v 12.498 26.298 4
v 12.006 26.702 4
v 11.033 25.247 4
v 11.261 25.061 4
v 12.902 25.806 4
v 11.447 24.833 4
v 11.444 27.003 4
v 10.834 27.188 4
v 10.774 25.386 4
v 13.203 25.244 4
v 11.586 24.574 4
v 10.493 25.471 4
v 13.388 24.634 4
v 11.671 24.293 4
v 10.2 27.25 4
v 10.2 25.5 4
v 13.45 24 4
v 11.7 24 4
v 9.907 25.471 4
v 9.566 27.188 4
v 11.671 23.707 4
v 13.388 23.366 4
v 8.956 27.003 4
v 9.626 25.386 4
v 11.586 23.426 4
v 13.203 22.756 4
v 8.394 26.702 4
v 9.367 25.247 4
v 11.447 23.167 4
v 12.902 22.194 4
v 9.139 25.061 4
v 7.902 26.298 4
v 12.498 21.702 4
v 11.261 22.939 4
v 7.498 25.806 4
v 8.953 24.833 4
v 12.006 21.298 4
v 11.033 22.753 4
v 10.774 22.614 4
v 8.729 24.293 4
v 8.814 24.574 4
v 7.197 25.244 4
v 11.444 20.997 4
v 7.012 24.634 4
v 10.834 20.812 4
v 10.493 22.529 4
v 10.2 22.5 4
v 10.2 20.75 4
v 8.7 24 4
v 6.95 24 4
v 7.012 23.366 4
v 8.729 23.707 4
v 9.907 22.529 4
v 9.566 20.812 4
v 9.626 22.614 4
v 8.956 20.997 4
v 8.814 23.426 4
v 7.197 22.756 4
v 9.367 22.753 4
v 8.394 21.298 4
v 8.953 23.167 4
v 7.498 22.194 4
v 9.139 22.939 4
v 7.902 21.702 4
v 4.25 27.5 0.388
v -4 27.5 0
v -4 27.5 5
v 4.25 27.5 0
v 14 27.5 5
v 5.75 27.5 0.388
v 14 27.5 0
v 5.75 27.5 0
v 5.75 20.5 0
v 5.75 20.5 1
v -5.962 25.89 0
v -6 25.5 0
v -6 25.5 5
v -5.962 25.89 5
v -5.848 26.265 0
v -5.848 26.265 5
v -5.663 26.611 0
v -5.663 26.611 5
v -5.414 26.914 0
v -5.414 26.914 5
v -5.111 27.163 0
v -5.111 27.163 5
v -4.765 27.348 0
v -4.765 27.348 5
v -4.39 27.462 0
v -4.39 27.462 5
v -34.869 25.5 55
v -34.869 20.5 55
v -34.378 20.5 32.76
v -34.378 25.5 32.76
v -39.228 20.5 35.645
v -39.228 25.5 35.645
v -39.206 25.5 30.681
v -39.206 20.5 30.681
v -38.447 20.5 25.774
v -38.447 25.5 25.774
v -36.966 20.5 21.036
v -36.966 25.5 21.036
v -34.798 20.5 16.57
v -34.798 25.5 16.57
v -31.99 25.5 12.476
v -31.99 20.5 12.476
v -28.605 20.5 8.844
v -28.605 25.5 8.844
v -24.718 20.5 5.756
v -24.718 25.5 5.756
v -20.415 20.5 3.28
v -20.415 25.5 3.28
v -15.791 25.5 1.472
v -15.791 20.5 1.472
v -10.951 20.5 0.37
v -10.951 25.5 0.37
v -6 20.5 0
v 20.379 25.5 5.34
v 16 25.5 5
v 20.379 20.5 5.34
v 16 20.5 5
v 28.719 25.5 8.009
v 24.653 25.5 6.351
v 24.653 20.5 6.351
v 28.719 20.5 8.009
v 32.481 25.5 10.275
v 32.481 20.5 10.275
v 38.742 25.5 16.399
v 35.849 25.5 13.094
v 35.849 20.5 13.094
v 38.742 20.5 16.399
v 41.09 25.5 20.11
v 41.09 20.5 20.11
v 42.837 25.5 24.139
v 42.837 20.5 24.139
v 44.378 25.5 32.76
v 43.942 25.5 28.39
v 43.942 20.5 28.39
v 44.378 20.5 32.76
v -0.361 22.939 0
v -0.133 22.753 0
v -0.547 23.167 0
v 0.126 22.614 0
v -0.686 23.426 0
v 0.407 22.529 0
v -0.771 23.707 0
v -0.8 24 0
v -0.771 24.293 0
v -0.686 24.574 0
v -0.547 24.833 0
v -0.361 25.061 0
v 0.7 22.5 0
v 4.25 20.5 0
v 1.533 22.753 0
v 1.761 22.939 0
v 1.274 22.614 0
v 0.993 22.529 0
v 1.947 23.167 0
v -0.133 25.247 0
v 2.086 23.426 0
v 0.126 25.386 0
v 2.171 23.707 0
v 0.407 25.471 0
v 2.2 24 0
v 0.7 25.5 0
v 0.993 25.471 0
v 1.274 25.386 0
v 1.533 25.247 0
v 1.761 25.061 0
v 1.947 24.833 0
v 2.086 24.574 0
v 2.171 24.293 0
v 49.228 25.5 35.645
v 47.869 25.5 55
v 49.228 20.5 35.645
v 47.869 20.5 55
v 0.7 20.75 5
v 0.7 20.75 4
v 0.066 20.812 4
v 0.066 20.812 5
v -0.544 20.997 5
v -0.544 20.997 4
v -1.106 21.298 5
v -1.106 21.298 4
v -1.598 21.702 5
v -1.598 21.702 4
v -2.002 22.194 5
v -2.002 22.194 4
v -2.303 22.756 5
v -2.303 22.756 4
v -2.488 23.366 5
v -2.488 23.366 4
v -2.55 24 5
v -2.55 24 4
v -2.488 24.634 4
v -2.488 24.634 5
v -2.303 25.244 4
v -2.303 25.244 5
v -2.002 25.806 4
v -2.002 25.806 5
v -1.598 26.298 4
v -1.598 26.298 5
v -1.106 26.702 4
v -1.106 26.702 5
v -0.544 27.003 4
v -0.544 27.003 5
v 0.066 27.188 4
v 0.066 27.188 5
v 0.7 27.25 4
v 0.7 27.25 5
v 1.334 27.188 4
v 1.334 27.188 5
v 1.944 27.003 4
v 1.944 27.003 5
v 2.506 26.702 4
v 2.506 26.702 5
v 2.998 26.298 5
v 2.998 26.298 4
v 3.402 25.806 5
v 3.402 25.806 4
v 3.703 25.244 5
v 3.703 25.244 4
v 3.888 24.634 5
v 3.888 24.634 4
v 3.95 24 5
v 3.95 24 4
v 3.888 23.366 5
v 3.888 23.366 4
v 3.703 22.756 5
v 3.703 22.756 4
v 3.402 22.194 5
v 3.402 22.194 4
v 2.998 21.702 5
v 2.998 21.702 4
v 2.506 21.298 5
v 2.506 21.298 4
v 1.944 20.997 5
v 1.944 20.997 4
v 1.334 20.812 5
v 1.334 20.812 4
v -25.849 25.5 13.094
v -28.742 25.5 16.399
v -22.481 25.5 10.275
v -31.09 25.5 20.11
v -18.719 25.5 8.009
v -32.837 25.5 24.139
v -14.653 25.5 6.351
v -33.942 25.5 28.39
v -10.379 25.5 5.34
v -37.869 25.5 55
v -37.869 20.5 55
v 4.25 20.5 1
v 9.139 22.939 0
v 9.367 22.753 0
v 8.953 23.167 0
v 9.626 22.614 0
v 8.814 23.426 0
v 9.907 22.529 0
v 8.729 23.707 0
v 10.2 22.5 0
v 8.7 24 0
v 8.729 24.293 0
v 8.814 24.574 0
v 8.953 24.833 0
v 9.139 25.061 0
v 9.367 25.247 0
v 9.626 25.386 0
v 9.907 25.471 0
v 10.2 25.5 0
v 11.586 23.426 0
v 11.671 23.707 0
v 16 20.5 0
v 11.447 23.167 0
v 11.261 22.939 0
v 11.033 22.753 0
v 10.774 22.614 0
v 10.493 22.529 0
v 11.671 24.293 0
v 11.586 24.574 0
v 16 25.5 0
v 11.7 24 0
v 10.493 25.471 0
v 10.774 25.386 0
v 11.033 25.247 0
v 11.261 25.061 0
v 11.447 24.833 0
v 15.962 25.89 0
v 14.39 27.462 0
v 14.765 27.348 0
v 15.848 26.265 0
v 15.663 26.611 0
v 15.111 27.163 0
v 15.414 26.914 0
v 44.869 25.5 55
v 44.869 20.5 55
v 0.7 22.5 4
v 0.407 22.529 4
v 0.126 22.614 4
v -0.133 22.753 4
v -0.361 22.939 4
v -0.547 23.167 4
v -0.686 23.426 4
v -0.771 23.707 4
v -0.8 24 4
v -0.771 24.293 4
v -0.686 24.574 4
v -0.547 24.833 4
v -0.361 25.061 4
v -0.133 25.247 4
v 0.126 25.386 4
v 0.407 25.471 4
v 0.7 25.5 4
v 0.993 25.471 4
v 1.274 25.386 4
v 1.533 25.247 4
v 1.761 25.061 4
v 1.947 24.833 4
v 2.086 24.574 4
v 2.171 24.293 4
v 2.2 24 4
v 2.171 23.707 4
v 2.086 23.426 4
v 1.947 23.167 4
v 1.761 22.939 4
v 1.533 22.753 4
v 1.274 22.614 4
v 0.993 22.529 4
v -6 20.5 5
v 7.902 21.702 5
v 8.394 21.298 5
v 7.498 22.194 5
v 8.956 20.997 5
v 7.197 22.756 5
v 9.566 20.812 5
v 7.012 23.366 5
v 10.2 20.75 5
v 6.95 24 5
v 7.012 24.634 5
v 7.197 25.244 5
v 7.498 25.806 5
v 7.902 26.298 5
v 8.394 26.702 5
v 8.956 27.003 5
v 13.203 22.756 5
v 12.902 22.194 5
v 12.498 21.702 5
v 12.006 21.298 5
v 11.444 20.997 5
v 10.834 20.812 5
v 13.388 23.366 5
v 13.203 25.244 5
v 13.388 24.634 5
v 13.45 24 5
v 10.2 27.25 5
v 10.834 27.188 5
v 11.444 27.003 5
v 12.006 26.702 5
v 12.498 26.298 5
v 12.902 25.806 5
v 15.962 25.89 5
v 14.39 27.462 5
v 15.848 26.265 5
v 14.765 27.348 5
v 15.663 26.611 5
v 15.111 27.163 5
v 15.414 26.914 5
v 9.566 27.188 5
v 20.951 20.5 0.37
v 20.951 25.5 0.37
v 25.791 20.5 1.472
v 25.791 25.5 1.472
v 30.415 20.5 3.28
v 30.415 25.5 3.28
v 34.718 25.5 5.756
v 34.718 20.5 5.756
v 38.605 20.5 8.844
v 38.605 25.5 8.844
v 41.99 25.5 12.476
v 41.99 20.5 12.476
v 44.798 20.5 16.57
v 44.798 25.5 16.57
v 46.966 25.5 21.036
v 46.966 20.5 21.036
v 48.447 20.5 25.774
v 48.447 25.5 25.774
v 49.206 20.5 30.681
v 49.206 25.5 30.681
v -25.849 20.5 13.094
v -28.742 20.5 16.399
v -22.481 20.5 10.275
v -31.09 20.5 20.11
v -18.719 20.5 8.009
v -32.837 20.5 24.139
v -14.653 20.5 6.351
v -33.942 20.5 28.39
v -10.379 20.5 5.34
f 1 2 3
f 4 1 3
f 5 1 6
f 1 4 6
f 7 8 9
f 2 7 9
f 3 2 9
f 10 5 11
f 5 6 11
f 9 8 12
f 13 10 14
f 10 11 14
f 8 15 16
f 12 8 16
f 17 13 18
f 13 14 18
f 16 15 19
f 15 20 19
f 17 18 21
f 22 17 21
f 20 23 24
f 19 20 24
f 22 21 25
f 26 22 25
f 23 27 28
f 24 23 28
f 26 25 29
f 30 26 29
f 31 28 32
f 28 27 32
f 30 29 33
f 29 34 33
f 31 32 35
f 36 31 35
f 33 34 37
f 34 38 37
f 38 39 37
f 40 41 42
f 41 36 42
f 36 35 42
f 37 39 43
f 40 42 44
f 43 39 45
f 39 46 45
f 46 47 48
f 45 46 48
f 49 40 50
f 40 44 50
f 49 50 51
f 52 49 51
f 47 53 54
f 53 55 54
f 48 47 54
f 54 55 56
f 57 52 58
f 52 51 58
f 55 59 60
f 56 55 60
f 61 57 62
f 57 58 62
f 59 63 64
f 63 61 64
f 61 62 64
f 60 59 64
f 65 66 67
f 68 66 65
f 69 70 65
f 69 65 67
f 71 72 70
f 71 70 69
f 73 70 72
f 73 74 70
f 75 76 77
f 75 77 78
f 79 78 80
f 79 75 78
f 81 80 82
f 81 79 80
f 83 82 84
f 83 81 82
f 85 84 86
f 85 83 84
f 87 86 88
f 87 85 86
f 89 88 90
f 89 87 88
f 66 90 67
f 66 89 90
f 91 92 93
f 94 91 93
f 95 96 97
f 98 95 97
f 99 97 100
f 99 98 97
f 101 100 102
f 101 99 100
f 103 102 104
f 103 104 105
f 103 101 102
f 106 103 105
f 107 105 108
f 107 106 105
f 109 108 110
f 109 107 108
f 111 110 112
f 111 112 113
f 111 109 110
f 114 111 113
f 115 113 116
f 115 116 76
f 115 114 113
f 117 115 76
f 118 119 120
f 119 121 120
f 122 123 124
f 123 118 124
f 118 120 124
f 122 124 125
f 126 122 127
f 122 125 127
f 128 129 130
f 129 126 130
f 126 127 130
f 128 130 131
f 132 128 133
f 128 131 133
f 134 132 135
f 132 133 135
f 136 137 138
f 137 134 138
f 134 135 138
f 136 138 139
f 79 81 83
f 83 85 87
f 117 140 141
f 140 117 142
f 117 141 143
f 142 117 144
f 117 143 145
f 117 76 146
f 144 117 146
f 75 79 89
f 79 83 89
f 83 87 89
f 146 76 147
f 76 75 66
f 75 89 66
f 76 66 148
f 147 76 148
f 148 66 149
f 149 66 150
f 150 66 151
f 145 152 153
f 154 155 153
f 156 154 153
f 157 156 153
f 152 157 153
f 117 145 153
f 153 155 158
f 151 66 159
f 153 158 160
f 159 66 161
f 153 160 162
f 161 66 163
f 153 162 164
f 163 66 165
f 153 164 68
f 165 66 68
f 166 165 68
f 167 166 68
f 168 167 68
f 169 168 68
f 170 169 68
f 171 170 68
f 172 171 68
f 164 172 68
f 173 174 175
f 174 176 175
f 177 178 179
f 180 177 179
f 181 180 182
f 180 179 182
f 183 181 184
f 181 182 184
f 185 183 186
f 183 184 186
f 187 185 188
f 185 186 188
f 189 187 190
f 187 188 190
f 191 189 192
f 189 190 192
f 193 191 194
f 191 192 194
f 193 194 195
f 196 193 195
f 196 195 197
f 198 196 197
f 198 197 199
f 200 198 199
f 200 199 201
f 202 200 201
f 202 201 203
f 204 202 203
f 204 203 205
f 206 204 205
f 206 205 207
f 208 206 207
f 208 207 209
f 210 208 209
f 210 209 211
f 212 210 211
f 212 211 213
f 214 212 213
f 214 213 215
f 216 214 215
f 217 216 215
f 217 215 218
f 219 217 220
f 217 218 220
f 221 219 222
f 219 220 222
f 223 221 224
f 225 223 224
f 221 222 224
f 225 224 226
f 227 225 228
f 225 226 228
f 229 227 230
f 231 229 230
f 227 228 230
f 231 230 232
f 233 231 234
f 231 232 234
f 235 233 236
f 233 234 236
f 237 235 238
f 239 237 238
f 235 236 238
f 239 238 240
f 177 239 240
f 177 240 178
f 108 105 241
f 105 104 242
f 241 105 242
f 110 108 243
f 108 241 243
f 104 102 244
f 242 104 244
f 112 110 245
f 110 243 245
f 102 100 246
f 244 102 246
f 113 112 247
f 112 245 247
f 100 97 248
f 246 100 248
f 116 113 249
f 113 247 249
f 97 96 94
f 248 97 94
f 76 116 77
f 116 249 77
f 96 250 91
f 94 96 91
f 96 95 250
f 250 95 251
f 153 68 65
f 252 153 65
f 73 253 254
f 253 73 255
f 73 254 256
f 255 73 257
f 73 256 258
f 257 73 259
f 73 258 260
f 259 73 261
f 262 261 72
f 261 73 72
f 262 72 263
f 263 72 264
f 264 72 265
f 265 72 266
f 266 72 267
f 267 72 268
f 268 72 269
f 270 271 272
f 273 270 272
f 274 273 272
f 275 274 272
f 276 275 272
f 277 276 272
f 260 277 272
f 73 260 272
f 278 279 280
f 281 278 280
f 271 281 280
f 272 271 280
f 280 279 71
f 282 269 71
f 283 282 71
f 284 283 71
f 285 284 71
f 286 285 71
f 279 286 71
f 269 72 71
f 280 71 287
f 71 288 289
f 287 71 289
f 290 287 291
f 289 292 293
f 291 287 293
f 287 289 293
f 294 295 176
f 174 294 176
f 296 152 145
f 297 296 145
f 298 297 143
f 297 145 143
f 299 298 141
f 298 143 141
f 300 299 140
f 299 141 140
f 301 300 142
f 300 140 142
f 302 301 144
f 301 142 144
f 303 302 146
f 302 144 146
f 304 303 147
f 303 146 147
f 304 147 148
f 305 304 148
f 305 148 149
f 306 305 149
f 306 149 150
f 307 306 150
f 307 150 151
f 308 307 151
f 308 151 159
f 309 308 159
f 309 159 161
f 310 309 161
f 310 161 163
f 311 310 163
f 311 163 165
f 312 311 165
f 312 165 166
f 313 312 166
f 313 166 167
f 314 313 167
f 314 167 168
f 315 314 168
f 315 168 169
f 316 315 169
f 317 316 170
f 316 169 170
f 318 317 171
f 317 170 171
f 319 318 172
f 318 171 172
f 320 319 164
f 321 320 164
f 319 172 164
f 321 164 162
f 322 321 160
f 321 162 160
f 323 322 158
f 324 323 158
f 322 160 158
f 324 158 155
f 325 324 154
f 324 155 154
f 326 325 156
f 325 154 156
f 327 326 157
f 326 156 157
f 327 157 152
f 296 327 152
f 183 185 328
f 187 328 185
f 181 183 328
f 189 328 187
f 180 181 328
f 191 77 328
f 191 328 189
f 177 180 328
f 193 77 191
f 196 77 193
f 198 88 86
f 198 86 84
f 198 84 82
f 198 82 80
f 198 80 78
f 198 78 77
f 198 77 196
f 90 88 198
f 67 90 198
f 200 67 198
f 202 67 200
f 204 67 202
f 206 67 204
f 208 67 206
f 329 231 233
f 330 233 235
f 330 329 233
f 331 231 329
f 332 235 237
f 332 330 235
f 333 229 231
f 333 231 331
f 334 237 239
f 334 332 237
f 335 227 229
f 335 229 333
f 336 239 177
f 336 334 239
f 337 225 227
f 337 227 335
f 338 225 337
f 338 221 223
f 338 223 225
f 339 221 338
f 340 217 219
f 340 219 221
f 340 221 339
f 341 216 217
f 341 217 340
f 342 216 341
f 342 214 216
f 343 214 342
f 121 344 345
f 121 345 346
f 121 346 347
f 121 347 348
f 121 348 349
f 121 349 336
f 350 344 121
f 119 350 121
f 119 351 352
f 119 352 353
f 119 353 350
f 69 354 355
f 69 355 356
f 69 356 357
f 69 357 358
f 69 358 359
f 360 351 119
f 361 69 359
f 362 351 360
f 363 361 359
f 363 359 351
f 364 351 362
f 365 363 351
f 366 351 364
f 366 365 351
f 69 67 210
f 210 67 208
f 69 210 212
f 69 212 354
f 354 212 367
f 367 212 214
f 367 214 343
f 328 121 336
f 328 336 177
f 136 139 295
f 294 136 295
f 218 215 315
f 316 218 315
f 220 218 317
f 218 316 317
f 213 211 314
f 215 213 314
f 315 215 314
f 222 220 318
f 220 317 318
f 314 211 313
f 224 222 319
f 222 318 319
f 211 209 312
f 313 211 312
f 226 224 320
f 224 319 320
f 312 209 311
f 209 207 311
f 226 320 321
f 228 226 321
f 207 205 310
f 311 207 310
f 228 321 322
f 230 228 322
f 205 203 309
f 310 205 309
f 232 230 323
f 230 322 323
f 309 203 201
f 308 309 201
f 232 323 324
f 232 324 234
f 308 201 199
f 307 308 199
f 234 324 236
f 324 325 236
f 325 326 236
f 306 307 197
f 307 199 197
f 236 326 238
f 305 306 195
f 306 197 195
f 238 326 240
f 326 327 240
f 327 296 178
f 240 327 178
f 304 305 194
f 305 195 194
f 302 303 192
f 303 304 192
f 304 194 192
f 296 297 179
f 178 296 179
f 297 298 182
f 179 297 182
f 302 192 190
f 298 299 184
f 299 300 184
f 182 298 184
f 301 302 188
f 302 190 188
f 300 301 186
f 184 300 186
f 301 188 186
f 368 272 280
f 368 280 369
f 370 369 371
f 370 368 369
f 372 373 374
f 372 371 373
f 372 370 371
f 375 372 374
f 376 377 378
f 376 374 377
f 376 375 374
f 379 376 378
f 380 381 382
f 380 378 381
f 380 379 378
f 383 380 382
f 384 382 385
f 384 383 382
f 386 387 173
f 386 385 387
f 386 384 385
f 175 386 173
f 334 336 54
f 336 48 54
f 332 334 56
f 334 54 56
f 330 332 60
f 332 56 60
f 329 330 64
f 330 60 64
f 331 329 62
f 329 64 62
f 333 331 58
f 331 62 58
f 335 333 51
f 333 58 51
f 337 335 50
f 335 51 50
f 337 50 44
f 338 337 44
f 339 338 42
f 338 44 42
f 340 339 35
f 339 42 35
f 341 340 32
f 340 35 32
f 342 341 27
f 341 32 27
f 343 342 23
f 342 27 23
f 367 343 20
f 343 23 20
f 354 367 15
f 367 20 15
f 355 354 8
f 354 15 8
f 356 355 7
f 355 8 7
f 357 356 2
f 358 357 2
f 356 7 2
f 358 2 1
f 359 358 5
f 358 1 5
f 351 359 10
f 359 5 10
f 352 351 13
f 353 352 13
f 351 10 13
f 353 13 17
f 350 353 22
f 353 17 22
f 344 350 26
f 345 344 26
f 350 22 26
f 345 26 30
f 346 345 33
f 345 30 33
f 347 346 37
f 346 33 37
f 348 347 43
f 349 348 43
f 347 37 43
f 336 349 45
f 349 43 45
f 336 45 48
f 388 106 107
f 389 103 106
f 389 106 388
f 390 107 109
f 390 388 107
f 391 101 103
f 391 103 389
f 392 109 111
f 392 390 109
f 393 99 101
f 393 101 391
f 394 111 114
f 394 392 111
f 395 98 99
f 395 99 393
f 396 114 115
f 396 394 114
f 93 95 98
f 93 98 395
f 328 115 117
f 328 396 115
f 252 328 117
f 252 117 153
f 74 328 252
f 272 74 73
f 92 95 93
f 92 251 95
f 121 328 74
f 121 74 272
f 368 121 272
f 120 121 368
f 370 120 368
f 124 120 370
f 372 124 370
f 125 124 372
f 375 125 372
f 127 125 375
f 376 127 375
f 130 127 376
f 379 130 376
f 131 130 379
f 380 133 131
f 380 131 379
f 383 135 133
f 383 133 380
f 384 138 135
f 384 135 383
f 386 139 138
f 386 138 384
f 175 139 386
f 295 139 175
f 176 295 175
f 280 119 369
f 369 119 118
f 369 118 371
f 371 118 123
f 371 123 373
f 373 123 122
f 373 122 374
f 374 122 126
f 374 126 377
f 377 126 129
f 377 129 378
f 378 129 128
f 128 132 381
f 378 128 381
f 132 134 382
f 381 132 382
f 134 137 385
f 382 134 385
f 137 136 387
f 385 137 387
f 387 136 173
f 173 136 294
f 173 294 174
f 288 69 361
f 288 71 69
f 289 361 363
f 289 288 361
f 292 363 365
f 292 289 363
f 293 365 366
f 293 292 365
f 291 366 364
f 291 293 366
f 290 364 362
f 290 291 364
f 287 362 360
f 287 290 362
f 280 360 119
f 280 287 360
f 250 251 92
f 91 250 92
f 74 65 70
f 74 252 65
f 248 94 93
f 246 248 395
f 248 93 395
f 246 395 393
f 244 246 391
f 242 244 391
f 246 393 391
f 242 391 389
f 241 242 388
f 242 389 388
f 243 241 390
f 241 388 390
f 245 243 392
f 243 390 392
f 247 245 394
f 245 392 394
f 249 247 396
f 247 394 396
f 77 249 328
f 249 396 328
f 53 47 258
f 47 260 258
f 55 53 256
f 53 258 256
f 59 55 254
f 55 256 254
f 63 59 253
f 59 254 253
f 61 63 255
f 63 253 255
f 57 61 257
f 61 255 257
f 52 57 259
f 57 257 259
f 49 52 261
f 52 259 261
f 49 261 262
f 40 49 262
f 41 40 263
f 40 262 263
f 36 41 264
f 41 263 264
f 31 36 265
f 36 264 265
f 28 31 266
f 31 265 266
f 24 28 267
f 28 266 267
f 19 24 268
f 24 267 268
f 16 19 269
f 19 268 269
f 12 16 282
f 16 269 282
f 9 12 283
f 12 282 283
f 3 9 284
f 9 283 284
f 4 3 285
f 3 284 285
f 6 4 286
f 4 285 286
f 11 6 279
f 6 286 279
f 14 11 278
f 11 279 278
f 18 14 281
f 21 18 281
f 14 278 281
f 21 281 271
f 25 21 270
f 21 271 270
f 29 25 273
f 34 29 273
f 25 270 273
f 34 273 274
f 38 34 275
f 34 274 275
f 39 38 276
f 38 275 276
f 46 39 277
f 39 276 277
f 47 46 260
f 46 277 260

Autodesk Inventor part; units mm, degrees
ref_plane "YZ Plane" through (0, 0, 0) normal (1, 0, 0) x (0, 1, 0)
ref_plane "XZ Plane" through (0, 0, 0) normal (0, 1, 0) x (-1, 0, 0)
ref_plane "XY Plane" through (0, 0, 0) normal (0, 0, 1) x (1, 0, 0)
ref_plane "Work Plane1" through (0, 0, 0) normal (0, 0, 1) x (1, 0, 0)
sketch "Sketch1" plane through (0, 0, 0) normal (0, 0, 1) x (1, 0, 0)
  circle A0 centre (10.2273, -23.9687) radius 0.75 projected
  circle A1 centre (0.7, 24) radius 0.75 projected
  circle A2 centre (10.2, 24) radius 0.75 projected
  circle A3 centre (0.7, -24) radius 0.75 projected
  arc A4 (-14, 7) -> (-16, 5) centre (-14, 5) ccw projected
  line L0 (-16, -15) -> (-16, 5) projected
  arc A5 (-16, -15) -> (-14, -17) centre (-14, -15) ccw projected
  line L1 (-8, -17) -> (-14, -17) projected
  arc A6 (-6, -19) -> (-8, -17) centre (-8, -19) ccw projected
  line L2 (-6, -25.5) -> (-6, -19) projected
  arc A7 (-6, -25.5) -> (-4, -27.5) centre (-4, -25.5) ccw projected
  line L3 (14, -27.5) -> (-4, -27.5) projected
  arc A8 (14, -27.5) -> (16, -25.5) centre (14, -25.5) ccw projected
  line L4 (16, -20.5) -> (16, -25.5) projected
  line L5 (-4, -20.5) -> (16, -20.5) projected
  line L6 (-4, -15) -> (-4, -20.5) projected
  line L7 (-14, -15) -> (-4, -15) projected
  line L8 (-14, 5) -> (-14, -15) projected
  line L9 (-4, 5) -> (-14, 5) projected
  line L10 (-4, 20.5) -> (-4, 5) projected
  line L11 (16, 20.5) -> (-4, 20.5) projected
  line L12 (16, 25.5) -> (16, 20.5) projected
  arc A9 (16, 25.5) -> (14, 27.5) centre (14, 25.5) ccw projected
  line L13 (-4, 27.5) -> (14, 27.5) projected
  arc A10 (-4, 27.5) -> (-6, 25.5) centre (-4, 25.5) ccw projected
  line L14 (-6, 9) -> (-6, 25.5) projected
  arc A11 (-8, 7) -> (-6, 9) centre (-8, 9) ccw projected
  line L15 (-14, 7) -> (-8, 7) projected
  line L16 (-4, 20.5) -> (-6, 20.5)
  point P0 (0, 0)
extrude "Extrusion1" add sketch "Sketch1" along normal blind 5 contours L14 A10 L13 A9 L12 L11 L16
sketch "Sketch2" plane through (0, 0, 5) normal (0, 0, 1) x (1, 0, 0)
  circle A0 centre (0.7, 24) radius 0.75 projected
  circle A1 centre (10.2, 24) radius 0.75 projected
  point P0 (0, 0)
hole "Hole1" at (0.7, 24, 5) at (10.2, 24, 5) direction (0, 0, -1) diameter 3 end through all counterbore diameter 6.5 counterbore depth 1
sketch "Sketch4" plane through (-6, 20.5, 0) normal (0, -1, 0) x (1, 0, 0)
  line L0 (0, 0) -> (22, 0) projected
  line L1 (11.75, -1) -> (10.25, -1) construction
  line L2 (10.25, -1) -> (10.25, 1) construction
  line L3 (10.25, 1) -> (11.75, 1) construction
  line L4 (11.75, 1) -> (11.75, -1) construction
  line L5 (11.75, -1) -> (10.25, 1) construction
  line L6 (10.25, -1) -> (11.75, 1) construction
  line L7 (10.25, 1) -> (11.75, 1)
  line L8 (11.75, 1) -> (11.75, 0)
  line L9 (11.75, 0) -> (10.25, 0)
  line L10 (10.25, 0) -> (10.25, 1)
  point P0 (6, 0)
  point P1 (11, 0)
  dimension "d9" = 1.5
  dimension "d10" = 2
extrude "Extrusion2" cut sketch "Sketch4" against normal through all
draft "FaceDraft1" angle 5 pull direction (0, -1, 0) faces at (5.25, 22.8333, 1) fixed edges at (5, 20.5, 1)
sketch "Sketch5" plane through (-6, 20.5, 5) normal (0, -1, 0) x (1, 0, 0)
  arc A0 (-33.2285, 30.645) -> (0, -5) centre (0, 28.3104) ccw
  line L0 (2, 0) -> (0, 0) projected
  arc A1 (-28.3785, 27.7601) -> (0, 0) centre (0, 28.3854) ccw
  line L1 (-33.2285, 30.645) -> (-31.8686, 50)
  line L2 (-31.8686, 50) -> (-28.8686, 50)
  line L3 (-28.8686, 50) -> (-28.3785, 27.7601)
  line L4 (0, 0) -> (22, 0) projected
  line L5 (0, -5) -> (10.25, -5) projected
  line L6 (0, -5) -> (0, 0) projected
  line L7 (0, -5) -> (0, 0)
  dimension "d15" = 50
  dimension "d16" = 3
ref_plane "Work Plane2" through (5, 20.5, 0) normal (1, 0, 0) x (0, 0, -1)
extrude "Extrusion3" add sketch "Sketch5" against normal blind 5
mirror "Mirror1" about plane through (5, 20.5, 0) normal (1, 0, 0) of "Extrusion3"
properties part number "leg"
